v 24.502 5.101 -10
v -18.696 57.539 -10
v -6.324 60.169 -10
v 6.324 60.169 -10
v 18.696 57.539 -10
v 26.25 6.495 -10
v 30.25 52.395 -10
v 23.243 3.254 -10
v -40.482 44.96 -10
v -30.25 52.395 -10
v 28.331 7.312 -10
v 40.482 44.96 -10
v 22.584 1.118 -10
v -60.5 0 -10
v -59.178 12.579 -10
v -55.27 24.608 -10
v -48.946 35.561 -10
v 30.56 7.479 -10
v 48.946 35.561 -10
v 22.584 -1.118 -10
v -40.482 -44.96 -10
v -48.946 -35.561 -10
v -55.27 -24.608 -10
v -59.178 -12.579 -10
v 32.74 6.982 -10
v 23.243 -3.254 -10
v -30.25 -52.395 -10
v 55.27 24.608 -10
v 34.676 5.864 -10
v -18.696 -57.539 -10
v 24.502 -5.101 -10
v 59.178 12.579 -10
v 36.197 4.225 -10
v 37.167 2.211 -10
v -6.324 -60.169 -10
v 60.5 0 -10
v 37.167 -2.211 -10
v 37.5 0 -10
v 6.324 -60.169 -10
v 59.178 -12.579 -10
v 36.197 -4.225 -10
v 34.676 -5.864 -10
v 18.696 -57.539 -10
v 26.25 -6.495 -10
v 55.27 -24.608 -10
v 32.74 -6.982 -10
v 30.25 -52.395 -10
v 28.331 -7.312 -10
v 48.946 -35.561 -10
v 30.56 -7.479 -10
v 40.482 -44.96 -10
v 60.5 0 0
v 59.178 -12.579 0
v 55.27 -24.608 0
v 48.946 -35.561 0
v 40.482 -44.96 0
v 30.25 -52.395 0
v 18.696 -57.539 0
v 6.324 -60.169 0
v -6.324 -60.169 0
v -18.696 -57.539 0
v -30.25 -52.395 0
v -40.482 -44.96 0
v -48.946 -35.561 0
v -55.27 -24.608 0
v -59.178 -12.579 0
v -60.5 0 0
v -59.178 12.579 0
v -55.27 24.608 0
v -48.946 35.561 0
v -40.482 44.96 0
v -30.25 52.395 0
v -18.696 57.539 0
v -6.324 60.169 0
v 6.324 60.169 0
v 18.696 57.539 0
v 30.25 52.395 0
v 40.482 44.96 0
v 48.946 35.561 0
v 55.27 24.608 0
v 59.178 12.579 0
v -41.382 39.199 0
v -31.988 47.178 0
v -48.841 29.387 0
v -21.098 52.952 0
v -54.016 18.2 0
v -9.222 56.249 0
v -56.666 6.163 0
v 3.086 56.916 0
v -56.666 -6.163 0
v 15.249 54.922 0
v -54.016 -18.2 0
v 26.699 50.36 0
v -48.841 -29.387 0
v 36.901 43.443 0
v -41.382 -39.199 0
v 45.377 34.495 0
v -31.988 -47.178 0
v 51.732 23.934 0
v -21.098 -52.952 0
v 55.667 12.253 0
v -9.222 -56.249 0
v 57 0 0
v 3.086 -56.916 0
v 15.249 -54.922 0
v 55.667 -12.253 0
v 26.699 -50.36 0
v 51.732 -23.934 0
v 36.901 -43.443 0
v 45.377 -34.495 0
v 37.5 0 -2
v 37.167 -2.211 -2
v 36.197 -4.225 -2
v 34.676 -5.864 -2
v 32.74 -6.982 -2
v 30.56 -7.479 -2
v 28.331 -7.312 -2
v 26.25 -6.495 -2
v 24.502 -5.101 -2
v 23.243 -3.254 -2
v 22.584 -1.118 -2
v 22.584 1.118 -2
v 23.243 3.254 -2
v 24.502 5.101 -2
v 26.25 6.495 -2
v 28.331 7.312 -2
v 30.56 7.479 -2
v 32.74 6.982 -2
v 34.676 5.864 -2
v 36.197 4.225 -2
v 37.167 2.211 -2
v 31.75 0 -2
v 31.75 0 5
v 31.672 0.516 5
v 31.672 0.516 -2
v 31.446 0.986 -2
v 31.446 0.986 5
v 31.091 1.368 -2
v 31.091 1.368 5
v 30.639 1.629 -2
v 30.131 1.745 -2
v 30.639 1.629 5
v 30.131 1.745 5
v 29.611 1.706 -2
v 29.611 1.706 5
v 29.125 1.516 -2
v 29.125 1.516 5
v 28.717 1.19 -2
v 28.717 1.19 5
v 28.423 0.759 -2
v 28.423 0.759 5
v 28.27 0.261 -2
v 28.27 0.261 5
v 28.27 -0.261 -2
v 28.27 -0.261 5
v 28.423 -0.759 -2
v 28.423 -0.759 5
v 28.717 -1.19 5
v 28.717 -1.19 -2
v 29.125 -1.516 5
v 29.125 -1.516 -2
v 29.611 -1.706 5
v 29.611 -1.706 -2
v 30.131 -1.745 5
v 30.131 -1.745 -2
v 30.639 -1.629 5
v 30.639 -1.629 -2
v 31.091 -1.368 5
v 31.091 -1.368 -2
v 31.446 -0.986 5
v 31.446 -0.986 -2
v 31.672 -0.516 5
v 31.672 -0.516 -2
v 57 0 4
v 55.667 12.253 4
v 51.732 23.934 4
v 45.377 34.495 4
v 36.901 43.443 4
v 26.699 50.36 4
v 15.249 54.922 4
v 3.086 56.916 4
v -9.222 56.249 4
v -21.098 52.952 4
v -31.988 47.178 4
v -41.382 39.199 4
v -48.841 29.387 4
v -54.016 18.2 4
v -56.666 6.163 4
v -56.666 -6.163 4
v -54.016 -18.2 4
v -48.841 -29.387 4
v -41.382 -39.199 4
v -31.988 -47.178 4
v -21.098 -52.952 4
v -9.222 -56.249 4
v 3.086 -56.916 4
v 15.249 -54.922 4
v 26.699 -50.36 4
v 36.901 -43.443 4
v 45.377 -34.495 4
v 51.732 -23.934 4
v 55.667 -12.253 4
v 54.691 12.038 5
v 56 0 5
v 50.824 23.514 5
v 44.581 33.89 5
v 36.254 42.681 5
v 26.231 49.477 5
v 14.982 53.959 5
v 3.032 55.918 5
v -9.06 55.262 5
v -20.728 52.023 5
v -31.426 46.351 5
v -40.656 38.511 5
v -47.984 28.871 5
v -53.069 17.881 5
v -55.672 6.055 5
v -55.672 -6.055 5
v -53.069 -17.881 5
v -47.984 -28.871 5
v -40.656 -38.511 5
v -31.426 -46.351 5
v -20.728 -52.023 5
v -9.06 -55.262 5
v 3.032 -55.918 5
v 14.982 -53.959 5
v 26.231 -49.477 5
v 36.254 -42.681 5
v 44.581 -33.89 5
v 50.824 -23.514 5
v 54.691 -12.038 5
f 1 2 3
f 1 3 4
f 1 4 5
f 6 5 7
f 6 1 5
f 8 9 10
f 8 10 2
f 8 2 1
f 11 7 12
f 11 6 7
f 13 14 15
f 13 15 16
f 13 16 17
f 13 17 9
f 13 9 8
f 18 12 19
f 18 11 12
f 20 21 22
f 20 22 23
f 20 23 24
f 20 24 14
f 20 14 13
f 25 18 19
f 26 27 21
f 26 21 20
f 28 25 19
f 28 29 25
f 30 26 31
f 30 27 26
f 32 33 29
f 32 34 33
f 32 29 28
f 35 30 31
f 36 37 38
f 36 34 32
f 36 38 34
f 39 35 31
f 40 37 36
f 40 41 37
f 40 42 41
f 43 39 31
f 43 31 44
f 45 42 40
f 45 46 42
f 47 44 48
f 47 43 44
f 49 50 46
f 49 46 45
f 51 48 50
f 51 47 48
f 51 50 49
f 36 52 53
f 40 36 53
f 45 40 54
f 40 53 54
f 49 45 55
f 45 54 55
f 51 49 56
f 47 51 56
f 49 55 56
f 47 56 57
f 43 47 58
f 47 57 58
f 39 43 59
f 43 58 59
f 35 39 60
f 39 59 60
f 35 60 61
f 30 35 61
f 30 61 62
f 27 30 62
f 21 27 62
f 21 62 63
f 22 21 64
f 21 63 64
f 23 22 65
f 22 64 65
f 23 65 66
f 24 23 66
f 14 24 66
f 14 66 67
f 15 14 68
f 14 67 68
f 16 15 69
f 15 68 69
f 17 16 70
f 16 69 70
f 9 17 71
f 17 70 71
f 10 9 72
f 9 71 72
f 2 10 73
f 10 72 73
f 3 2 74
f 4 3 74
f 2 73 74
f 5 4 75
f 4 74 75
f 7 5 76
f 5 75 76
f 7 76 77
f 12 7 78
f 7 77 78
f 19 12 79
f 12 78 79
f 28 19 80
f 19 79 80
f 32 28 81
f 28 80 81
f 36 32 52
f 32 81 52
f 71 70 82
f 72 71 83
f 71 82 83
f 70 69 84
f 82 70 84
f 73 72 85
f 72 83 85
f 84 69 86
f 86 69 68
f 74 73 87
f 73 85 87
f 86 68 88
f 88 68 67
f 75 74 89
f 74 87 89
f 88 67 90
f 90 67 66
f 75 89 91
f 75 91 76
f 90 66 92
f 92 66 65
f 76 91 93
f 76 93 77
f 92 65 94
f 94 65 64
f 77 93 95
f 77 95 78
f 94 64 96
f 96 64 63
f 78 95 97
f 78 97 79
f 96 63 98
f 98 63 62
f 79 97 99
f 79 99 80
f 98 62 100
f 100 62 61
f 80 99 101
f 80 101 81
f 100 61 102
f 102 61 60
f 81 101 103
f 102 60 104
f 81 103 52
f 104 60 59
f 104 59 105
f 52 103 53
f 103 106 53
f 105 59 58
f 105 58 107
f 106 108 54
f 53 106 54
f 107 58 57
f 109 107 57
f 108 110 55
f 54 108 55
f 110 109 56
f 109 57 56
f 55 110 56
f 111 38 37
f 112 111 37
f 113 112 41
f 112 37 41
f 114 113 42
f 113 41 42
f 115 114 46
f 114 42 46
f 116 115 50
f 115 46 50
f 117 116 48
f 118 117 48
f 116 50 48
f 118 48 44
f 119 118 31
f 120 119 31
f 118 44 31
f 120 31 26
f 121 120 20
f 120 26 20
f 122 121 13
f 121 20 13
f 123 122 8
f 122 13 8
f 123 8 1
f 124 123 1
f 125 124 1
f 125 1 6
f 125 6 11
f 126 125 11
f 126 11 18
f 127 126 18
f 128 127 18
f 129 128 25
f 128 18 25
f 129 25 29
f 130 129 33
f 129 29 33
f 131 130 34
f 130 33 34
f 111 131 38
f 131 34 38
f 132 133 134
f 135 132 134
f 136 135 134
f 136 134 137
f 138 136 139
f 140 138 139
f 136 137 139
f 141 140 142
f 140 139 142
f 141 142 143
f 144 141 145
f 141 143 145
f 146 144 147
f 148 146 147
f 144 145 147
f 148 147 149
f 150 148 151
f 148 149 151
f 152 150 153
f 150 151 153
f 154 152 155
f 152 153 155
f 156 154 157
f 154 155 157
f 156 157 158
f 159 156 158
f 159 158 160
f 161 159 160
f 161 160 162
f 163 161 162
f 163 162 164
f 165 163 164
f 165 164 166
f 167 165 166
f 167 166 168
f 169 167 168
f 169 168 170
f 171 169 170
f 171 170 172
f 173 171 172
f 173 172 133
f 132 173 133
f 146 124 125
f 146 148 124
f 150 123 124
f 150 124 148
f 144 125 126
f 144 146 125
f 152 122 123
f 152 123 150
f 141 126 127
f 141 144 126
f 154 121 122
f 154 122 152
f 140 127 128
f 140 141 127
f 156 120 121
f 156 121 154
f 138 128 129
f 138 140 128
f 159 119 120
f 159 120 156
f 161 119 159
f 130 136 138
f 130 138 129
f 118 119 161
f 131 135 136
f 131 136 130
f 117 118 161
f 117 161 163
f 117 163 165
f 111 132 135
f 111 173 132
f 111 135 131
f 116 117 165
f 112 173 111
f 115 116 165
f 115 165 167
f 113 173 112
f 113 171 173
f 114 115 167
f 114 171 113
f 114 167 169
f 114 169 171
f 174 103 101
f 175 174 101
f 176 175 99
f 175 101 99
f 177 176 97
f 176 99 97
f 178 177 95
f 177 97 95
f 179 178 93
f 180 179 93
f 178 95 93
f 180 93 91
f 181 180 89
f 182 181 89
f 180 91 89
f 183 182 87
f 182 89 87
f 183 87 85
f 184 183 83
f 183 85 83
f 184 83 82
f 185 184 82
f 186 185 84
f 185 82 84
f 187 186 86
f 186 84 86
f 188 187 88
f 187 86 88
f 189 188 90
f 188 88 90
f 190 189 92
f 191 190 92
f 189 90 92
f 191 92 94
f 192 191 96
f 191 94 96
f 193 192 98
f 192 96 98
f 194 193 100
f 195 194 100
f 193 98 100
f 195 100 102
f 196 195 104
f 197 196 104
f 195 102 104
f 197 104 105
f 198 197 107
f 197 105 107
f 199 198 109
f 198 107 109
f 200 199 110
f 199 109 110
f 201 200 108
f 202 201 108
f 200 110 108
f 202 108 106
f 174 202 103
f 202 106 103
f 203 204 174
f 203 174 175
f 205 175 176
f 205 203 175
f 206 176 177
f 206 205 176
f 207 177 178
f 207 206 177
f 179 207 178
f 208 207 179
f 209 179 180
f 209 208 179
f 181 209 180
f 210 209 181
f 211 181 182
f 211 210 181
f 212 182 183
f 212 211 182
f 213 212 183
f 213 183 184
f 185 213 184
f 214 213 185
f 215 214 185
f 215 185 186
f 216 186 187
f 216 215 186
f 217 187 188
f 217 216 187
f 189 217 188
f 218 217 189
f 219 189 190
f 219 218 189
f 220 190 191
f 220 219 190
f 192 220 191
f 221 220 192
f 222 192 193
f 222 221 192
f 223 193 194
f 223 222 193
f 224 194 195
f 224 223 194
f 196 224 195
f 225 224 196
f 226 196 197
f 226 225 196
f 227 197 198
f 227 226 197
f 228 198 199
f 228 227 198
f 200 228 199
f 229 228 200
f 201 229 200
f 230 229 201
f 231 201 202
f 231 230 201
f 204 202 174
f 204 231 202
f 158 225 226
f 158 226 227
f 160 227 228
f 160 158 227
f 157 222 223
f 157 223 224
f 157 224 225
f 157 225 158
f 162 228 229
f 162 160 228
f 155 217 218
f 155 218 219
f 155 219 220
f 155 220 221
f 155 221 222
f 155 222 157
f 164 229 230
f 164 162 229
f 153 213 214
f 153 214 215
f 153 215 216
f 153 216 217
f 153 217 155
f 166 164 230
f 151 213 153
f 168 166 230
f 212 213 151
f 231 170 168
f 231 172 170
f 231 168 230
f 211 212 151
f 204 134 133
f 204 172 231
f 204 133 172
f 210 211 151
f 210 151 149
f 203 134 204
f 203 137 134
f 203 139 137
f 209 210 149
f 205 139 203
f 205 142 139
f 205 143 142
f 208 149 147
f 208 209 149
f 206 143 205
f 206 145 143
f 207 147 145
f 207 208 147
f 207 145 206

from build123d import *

# Parameters (mm, degrees)
SKETCH_R        = 57
PAD_DEPTH       = 5
SKETCH001_R     = 60.5
PAD001_DEPTH    = 10
CHAMFER_SIZE    = 1
SKETCH002_R     = 1.75
POCKET_DEPTH    = 15.001
SKETCH003_R     = 7.5
POCKET001_DEPTH = 8


with BuildPart() as part:
    # Sketch → Pad (new body)
    with BuildSketch(Plane.XY):
        Circle(SKETCH_R)
    extrude(amount=PAD_DEPTH)

    # Sketch001 (on Face2 of Pad) → Pad001 (join)
    with BuildSketch(Plane(origin=(0, 0, 0), x_dir=(1, 0, 0), z_dir=(0, 0, -1))):
        Circle(SKETCH001_R)
    extrude(amount=PAD001_DEPTH)

    # Chamfer
    chamfer_edges = [part.edges().sort_by_distance(p)[0] for p in [
        (-57, 0, 5),
    ]]
    chamfer(chamfer_edges, length=CHAMFER_SIZE)

    # Sketch002 (on Face4 of Chamfer) → Pocket (cut, through all)
    with BuildSketch(Plane.XY.offset(5)):
        with Locations((30, 0)):
            Circle(SKETCH002_R)
    extrude(amount=-POCKET_DEPTH, mode=Mode.SUBTRACT)

    # Sketch003 (on Face7 of Pocket) → Pocket001 (cut)
    with BuildSketch(Plane(origin=(0, 0, -10), x_dir=(1, 0, 0), z_dir=(0, 0, -1))):
        with Locations((30, 0)):
            Circle(SKETCH003_R)
    extrude(amount=-POCKET001_DEPTH, mode=Mode.SUBTRACT)


solid = part.part
